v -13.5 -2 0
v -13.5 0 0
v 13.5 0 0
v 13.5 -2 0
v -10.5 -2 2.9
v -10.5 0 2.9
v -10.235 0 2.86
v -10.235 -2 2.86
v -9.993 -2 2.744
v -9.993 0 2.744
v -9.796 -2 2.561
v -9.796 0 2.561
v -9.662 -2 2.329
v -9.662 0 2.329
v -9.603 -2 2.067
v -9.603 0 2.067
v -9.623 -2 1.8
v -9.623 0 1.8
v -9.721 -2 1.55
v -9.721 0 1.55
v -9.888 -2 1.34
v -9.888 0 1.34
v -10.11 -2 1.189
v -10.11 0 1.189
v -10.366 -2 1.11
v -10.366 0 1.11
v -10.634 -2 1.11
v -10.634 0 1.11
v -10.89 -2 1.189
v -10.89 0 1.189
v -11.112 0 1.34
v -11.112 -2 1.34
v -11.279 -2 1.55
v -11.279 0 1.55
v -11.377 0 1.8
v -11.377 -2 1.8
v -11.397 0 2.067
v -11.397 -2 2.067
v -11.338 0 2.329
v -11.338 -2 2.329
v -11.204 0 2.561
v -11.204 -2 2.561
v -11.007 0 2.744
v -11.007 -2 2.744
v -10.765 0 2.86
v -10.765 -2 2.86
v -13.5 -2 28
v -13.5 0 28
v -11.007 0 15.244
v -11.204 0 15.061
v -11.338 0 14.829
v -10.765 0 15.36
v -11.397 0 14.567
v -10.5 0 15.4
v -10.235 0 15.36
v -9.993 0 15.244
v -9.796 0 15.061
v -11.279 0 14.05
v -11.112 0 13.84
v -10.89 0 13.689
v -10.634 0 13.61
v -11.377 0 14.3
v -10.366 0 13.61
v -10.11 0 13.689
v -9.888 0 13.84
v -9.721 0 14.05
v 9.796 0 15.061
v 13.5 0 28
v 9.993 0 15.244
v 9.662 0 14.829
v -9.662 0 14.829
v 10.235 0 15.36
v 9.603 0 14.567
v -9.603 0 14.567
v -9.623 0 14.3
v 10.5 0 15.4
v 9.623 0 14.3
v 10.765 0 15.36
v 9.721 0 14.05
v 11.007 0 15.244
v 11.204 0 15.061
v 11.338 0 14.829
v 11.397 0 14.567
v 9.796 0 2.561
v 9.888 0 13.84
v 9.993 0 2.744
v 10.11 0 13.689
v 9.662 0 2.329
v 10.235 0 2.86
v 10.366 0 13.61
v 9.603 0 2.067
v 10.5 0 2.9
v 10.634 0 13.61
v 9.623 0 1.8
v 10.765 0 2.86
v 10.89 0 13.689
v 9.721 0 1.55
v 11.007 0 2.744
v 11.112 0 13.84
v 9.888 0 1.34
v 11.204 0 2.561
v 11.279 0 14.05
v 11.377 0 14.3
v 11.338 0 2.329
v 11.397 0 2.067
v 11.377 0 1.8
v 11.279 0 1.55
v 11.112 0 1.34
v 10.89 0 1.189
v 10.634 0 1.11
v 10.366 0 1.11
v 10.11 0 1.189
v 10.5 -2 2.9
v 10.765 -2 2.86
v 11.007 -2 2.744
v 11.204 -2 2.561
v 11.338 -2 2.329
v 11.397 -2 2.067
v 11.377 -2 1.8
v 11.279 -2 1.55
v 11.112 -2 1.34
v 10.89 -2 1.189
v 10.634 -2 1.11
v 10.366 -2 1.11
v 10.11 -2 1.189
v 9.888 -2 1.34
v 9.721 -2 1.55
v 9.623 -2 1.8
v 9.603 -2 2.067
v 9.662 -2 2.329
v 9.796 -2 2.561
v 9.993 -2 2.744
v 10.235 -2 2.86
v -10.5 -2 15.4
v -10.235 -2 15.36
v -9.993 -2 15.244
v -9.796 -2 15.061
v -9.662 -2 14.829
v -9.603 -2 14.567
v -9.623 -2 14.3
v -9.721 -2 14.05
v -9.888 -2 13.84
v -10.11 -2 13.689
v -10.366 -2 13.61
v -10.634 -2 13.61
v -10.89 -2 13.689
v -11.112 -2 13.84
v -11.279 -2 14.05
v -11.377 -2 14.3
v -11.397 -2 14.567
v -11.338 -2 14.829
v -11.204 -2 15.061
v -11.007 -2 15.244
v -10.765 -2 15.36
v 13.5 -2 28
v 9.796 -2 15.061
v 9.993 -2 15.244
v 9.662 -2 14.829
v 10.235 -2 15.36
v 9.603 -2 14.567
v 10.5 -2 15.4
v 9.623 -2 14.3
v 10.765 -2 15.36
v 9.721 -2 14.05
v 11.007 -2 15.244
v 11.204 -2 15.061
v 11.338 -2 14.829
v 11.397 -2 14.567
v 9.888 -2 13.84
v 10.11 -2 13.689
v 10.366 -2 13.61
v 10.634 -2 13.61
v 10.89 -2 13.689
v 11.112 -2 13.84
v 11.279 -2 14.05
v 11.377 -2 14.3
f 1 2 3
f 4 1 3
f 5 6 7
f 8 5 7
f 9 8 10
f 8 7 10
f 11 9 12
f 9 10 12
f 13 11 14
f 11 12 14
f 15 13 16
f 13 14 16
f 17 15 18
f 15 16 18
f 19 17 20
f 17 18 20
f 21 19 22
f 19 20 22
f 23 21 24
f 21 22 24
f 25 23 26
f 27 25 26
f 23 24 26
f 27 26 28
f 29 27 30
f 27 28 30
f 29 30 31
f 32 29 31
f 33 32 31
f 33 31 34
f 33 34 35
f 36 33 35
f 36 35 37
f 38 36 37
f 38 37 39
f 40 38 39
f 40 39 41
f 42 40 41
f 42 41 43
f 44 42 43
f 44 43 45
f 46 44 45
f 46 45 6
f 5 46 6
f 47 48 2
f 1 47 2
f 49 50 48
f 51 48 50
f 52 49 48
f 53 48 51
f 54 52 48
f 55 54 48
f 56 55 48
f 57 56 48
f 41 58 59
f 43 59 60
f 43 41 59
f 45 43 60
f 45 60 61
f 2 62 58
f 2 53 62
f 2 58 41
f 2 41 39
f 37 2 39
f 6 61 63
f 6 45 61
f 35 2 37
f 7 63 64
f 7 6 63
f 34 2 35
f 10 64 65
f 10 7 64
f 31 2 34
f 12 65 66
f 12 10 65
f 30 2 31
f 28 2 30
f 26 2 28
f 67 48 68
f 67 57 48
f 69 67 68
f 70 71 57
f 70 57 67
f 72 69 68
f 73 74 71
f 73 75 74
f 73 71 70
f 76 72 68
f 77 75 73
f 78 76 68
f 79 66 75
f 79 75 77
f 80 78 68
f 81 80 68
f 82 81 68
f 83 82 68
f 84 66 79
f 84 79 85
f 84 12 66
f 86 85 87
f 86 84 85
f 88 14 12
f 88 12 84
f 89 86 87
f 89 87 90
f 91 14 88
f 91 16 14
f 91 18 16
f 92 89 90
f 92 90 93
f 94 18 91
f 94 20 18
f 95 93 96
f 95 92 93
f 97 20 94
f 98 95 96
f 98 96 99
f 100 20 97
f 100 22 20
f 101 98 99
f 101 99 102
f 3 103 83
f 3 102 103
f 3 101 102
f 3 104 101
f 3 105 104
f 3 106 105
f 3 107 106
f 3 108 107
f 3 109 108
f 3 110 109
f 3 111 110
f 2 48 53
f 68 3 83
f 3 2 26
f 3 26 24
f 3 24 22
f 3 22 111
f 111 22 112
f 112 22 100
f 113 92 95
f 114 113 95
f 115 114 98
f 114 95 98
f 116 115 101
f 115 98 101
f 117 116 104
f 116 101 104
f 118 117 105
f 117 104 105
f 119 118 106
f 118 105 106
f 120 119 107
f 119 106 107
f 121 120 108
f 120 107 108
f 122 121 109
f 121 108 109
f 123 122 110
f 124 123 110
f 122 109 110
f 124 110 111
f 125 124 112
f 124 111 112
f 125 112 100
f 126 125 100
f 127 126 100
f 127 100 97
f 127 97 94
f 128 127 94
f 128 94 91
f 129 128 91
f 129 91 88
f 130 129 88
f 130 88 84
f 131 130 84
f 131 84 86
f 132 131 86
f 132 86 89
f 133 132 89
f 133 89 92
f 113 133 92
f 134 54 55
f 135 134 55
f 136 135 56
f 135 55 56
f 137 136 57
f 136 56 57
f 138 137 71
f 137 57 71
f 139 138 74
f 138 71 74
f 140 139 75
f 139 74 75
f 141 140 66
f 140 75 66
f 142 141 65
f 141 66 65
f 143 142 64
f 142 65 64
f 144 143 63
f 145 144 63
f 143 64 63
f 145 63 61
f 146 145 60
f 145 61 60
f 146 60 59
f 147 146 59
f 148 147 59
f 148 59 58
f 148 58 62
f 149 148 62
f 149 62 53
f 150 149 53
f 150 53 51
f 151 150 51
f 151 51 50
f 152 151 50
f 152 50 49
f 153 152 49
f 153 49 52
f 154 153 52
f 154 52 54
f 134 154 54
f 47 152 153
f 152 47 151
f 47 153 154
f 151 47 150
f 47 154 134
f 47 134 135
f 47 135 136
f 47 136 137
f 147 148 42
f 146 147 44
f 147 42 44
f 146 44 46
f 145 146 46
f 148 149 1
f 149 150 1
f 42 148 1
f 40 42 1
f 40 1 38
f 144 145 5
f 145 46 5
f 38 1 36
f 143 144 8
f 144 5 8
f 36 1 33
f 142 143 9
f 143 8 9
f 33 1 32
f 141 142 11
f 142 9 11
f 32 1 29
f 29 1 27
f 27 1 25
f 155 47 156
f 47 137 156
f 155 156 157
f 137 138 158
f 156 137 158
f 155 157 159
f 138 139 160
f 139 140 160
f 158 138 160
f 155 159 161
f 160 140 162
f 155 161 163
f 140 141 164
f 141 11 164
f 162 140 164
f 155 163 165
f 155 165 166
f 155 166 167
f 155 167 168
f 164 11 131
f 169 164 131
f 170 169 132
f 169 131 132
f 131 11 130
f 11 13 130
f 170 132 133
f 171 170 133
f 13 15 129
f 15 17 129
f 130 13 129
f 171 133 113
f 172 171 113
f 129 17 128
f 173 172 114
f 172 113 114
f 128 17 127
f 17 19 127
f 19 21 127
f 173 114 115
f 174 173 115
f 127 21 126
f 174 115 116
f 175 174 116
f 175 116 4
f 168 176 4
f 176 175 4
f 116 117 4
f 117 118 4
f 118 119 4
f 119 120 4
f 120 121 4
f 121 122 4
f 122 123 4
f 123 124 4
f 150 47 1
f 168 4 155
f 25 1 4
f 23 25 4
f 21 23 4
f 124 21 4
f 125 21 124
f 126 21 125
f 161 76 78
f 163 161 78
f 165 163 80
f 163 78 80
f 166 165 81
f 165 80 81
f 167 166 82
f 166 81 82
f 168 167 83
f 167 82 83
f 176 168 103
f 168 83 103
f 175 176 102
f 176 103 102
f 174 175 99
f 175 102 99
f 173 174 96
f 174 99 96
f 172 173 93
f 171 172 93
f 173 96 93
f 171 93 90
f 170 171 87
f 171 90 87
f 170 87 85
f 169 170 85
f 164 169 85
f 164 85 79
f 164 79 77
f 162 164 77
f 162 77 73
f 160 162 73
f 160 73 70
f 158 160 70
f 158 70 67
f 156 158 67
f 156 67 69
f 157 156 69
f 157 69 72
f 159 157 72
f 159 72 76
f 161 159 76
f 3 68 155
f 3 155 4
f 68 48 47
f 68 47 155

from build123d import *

# Parameters (mm, degrees)
SKETCH3_W           = 27
SKETCH3_H           = 28
BOSS_EXTRUDE1_DEPTH = 2
SKETCH2_R           = 0.9
CUT_EXTRUDE1_DEPTH  = 10


with BuildPart() as part:
    # Sketch3 → Boss-Extrude1 (new body)
    with BuildSketch(Plane(origin=(0, 0, 0), x_dir=(1, 0, 0), z_dir=(0, 1, 0))):
        with Locations((0, -14)):
            Rectangle(SKETCH3_W, SKETCH3_H)
    extrude(amount=-BOSS_EXTRUDE1_DEPTH)

    # Sketch2 → Cut-Extrude1 (cut)
    with BuildSketch(Plane(origin=(0, 0, 0), x_dir=(1, 0, 0), z_dir=(0, 1, 0))):
        with Locations(Location((-10.5, -2, 0), (0, 0, 270))):
            Circle(SKETCH2_R)
        with Locations(Location((-10.5, -14.5, 0), (0, 0, 270))):
            Circle(SKETCH2_R)
        with Locations(Location((10.5, -14.5, 0), (0, 0, 270))):
            Circle(SKETCH2_R)
        with Locations(Location((10.5, -2, 0), (0, 0, 270))):
            Circle(SKETCH2_R)
    extrude(amount=-CUT_EXTRUDE1_DEPTH, mode=Mode.SUBTRACT)


solid = part.part
